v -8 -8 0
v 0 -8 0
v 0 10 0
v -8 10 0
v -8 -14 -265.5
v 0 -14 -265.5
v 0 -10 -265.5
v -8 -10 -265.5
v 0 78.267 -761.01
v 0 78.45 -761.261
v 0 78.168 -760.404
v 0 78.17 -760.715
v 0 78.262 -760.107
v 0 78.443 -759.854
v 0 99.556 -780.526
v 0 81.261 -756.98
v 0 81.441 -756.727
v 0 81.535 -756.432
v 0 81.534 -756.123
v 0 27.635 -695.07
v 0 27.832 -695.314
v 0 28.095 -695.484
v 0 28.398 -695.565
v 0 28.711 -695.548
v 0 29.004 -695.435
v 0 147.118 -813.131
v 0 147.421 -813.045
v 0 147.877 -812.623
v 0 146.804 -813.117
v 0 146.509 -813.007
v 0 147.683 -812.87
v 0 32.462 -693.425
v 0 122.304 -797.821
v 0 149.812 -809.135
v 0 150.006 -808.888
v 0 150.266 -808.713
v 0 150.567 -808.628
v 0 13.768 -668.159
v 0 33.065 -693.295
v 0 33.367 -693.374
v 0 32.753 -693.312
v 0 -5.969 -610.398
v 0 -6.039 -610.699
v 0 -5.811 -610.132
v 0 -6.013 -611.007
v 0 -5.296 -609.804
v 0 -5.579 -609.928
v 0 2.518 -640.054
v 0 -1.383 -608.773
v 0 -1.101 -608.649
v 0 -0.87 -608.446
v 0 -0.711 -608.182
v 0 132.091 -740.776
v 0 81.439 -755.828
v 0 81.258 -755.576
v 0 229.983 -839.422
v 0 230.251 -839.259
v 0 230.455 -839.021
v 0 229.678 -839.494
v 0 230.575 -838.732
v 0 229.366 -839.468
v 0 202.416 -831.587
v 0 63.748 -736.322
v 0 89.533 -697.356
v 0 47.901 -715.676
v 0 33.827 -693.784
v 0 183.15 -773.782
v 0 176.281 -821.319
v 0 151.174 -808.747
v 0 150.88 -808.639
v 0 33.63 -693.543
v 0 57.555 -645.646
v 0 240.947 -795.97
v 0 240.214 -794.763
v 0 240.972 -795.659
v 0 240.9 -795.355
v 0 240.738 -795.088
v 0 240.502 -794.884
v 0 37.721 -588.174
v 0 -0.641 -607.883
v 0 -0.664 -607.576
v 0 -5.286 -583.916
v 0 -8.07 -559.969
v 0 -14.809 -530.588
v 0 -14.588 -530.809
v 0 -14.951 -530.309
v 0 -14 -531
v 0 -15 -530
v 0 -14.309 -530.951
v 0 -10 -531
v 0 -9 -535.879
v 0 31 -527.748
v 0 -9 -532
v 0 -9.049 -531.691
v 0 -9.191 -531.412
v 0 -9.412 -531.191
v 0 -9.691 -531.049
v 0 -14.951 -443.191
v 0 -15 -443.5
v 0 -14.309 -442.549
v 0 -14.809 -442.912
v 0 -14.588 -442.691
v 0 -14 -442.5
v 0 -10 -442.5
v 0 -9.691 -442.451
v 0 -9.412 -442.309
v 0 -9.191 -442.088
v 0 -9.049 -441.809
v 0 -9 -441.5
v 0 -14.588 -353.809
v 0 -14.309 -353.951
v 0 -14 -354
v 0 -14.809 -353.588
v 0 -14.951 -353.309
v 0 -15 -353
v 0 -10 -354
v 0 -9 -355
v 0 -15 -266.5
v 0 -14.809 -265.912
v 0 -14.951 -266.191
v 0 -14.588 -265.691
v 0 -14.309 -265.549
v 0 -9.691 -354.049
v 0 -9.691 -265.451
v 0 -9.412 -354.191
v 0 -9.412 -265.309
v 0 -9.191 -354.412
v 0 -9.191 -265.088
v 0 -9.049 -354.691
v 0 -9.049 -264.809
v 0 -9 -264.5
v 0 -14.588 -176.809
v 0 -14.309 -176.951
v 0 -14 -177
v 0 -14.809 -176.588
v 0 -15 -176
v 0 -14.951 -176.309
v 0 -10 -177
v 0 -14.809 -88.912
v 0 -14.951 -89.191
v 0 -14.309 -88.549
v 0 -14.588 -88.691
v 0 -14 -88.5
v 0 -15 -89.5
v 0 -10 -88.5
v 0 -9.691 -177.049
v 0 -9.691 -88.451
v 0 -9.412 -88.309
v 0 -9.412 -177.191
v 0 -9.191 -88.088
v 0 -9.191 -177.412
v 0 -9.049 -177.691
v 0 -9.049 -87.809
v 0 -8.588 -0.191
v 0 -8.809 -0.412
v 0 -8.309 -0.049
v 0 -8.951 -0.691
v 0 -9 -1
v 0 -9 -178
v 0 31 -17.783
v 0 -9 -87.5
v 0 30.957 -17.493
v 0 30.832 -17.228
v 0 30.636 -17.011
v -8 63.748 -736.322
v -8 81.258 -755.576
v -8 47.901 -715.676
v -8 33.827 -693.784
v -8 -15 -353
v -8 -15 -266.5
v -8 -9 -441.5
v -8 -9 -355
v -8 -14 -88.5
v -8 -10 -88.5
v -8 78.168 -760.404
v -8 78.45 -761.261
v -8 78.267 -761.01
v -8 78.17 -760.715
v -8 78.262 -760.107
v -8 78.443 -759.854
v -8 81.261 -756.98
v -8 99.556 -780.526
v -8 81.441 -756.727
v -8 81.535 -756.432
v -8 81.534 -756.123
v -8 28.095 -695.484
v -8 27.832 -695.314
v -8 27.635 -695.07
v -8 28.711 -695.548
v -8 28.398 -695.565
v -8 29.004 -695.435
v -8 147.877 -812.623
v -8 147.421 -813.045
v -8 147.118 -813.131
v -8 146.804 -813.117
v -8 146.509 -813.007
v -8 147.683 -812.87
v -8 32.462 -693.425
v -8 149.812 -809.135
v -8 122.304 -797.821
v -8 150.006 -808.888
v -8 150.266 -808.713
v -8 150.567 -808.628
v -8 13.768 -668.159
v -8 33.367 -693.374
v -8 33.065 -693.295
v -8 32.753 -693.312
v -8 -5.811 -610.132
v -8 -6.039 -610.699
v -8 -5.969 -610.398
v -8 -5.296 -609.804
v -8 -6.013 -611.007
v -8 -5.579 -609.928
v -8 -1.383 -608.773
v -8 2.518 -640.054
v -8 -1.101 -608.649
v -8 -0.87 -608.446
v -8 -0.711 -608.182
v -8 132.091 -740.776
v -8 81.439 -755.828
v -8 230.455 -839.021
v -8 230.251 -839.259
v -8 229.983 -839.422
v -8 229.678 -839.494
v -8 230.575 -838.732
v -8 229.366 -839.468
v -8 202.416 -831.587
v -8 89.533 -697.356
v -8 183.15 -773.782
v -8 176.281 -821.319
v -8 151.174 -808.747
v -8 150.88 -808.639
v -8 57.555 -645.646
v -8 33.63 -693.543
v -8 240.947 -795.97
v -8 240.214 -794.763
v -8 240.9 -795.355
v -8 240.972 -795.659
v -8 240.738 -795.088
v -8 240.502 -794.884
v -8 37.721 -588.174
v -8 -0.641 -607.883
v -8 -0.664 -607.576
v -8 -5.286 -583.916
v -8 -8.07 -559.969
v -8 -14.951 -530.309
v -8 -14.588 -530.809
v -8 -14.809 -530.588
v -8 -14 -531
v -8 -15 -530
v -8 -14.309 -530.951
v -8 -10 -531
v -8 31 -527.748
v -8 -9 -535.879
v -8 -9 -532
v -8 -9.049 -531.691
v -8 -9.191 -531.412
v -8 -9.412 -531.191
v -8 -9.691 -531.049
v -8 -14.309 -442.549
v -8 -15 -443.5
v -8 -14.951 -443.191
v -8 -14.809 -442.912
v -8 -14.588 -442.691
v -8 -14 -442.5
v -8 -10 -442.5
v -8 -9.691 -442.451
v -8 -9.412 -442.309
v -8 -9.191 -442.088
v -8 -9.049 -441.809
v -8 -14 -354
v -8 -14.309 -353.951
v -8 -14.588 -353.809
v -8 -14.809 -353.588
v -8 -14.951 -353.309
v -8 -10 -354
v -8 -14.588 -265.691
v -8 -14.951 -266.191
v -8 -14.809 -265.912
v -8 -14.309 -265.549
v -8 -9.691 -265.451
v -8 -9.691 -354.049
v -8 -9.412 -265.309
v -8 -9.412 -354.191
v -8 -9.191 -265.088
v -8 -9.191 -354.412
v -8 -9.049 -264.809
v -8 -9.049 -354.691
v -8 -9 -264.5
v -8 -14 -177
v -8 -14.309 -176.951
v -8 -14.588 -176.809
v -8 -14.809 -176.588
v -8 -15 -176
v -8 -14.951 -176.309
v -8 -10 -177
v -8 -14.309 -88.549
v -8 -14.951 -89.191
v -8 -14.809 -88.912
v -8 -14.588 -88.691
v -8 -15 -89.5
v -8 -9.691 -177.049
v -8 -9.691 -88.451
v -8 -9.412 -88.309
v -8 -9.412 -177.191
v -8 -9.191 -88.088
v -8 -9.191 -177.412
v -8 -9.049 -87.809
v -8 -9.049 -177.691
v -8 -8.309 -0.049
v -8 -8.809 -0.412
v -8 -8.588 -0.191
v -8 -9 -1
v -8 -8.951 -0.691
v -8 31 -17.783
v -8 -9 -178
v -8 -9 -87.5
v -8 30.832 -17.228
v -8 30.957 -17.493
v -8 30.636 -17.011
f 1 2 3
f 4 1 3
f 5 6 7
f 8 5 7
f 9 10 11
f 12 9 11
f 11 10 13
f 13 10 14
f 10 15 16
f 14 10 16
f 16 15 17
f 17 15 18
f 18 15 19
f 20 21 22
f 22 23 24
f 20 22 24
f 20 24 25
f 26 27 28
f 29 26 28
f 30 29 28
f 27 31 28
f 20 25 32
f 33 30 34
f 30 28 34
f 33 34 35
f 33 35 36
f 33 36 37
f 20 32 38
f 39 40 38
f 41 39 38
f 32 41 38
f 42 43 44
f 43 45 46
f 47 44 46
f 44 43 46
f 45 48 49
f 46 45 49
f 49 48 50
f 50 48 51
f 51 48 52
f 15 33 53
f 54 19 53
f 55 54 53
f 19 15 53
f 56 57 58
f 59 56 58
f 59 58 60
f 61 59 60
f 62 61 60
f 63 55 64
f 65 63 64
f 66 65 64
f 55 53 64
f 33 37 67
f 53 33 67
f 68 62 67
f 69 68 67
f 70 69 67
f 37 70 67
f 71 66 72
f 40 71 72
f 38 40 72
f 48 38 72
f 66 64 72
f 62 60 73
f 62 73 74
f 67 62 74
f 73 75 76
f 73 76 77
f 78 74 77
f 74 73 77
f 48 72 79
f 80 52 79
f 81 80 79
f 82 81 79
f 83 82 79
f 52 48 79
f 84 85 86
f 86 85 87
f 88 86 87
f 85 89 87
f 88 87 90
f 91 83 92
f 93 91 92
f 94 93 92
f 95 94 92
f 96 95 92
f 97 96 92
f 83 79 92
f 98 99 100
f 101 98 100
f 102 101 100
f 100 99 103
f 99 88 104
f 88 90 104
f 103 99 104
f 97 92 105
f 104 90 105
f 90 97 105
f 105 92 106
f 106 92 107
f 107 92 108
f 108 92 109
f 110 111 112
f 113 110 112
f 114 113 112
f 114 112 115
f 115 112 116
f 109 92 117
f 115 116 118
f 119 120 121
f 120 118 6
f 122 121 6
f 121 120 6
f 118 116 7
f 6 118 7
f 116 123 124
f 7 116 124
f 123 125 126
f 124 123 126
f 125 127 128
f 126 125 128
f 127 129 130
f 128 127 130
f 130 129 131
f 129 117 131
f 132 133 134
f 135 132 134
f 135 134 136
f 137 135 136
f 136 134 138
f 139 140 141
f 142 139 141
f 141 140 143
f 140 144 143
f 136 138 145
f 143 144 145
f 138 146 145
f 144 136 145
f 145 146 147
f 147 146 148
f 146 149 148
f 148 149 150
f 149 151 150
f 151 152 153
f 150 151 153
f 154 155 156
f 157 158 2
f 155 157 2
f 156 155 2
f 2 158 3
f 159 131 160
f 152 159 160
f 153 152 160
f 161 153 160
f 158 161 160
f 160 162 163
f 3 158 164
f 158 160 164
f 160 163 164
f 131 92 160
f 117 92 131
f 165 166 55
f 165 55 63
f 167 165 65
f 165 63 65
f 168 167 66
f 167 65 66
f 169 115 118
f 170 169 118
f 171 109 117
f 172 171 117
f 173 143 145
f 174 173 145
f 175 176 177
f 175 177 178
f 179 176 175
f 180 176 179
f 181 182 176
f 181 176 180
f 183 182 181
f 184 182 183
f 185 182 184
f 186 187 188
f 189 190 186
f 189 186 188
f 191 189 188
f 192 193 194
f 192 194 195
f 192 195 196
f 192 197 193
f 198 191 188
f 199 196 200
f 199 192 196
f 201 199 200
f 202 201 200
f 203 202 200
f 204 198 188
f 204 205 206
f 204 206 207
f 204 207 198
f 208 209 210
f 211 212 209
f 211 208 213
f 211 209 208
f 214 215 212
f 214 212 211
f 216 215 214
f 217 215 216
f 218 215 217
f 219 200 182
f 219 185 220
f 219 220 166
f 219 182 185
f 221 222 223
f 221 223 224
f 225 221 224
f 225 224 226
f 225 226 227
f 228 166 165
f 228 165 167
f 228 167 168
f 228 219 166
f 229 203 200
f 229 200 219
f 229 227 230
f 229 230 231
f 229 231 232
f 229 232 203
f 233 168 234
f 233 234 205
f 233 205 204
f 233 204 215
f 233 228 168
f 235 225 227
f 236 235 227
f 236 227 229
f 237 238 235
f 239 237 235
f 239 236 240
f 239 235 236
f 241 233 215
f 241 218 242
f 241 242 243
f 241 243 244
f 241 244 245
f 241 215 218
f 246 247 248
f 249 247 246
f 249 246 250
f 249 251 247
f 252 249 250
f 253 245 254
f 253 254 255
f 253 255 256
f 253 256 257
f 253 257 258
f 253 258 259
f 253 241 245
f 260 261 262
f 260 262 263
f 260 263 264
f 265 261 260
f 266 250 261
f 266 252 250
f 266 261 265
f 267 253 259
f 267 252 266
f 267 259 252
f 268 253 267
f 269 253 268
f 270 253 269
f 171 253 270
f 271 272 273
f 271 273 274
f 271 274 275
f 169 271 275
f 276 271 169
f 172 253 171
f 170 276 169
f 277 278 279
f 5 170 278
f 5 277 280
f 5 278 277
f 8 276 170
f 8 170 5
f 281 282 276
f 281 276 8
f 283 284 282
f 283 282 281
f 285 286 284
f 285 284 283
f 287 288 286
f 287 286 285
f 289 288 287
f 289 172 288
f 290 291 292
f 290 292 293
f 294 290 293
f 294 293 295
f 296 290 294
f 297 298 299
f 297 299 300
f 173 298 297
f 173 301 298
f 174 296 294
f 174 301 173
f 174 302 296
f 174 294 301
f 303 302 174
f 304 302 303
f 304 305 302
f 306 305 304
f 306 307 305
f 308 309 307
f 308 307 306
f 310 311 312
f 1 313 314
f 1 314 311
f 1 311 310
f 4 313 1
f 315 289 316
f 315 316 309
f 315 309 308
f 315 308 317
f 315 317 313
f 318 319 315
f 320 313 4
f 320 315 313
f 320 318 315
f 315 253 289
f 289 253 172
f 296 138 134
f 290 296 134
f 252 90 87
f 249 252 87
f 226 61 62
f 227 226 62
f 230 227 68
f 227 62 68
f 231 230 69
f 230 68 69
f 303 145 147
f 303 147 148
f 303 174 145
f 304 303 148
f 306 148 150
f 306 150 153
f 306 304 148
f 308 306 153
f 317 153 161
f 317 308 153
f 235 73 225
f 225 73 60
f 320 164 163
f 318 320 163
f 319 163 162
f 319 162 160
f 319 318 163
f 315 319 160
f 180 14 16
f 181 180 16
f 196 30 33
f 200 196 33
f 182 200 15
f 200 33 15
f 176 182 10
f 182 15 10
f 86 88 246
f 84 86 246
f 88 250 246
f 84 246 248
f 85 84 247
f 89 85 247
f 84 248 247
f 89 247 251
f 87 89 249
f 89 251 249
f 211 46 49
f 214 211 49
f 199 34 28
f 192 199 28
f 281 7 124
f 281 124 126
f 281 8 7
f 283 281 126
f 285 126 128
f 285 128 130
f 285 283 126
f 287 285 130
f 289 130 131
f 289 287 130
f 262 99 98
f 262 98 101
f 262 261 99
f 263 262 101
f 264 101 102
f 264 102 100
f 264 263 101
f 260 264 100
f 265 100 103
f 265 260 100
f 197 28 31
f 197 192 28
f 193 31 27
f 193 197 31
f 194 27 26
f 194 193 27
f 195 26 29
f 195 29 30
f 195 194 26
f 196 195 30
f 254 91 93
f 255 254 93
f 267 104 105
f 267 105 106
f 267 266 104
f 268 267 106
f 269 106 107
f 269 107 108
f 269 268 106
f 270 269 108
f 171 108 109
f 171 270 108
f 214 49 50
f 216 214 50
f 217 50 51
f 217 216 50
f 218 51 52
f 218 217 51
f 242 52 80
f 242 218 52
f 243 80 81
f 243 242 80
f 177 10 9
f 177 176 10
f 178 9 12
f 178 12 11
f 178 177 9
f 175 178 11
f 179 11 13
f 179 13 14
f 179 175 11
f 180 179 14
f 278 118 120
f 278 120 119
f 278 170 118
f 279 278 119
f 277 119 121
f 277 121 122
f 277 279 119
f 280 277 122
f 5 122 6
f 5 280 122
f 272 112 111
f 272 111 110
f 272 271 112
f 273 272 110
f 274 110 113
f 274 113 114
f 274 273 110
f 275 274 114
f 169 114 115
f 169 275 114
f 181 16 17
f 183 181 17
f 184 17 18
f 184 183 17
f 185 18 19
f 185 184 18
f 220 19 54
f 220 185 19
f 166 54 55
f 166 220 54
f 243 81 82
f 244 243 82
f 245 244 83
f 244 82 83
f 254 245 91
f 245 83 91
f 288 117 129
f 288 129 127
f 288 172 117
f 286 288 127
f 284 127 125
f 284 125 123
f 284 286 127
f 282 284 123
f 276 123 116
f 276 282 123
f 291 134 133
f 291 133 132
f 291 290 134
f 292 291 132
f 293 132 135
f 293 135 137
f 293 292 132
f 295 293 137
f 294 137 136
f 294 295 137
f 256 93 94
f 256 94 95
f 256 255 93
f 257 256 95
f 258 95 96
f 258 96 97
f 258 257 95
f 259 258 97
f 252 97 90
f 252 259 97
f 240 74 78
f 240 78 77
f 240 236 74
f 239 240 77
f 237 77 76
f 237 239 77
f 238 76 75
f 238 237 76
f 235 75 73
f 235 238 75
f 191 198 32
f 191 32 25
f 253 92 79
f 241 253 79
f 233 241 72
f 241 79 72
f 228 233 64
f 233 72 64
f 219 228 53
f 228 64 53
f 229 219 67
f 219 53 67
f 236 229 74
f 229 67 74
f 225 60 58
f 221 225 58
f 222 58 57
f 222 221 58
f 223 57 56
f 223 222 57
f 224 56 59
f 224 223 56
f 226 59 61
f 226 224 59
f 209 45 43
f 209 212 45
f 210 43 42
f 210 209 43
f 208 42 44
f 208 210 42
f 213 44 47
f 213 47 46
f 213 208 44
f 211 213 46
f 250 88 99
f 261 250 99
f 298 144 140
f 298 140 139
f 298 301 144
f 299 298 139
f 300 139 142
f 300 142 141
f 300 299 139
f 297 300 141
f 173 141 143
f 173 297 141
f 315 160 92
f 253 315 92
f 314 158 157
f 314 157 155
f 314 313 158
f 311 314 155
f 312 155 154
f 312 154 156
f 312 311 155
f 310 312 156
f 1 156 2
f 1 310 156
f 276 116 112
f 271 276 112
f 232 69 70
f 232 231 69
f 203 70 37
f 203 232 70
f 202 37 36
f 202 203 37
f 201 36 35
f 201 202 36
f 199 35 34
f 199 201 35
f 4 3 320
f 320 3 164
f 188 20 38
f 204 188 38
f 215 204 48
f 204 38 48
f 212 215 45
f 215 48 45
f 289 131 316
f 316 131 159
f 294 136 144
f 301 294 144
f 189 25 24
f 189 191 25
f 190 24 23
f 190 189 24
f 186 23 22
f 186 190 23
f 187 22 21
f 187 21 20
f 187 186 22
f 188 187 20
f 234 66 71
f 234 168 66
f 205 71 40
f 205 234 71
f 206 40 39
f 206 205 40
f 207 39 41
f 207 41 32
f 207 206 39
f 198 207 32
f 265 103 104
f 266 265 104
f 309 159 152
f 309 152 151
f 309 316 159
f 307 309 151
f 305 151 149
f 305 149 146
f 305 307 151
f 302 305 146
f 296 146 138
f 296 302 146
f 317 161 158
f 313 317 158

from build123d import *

# Parameters (mm, degrees)
BASE_FLANGE1_DEPTH = 8
FILLET_1_0_R       = 1


# Sheet-metal steps are written as plain solids
with BuildPart() as part:
    # Sketch1 → Base-Flange1 (new body)
    with BuildSketch(Plane(origin=(0, 0, 0), x_dir=(0, 0, -1), z_dir=(1, 0, 0))):
        with BuildLine():
            Line((531, -15), (442.5, -15))
            Line((442.5, -15), (442.5, -9))
            Line((442.5, -9), (354, -9))
            Line((354, -9), (354, -15))
            Line((354, -15), (265.5, -15))
            Line((265.5, -15), (265.5, -9))
            Line((265.5, -9), (177, -9))
            Line((177, -9), (177, -15))
            Line((177, -15), (88.5, -15))
            Line((88.5, -15), (88.5, -9))
            Line((88.5, -9), (0, -9))
            Line((0, -9), (0, 10))
            Line((0, 10), (17.311064102, 31))
            Line((17.311064102, 31), (527.748052756, 31))
            ThreePointArc((527.748052756, 31), (697.748052756, 89.840336788), (795, 241.181818182))
            Line((795, 241.181818182), (839.703962084, 230.339504132))
            ThreePointArc((839.703962084, 230.339504132), (826.746837948, 189.2327939), (808.257153356, 150.299771211))
            Line((808.257153356, 150.299771211), (813.503193561, 147.387888287))
            ThreePointArc((813.503193561, 147.387888287), (789.433768579, 110.742928998), (760.560188707, 77.750404912))
            Line((760.560188707, 77.750404912), (756.275511236, 81.951113323))
            ThreePointArc((756.275511236, 81.951113323), (726.159050553, 55.606079515), (692.923211747, 33.325122864))
            Line((692.923211747, 33.325122864), (695.938293543, 28.137816444))
            ThreePointArc((695.938293543, 28.137816444), (654.250802879, 7.812798402), (610.053579846, -6.242759659))
            Line((610.053579846, -6.242759659), (608.523872748, -0.439504608))
            ThreePointArc((608.523872748, -0.439504608), (572.452930854, -6.852497602), (535.879339812, -9))
            Line((535.879339812, -9), (531, -9))
            Line((531, -9), (531, -15))
        make_face()
    extrude(amount=-BASE_FLANGE1_DEPTH)

    # Fillet-1.0
    fillet_1_0_edges = [part.edges().sort_by_distance(p)[0] for p in [
        (-4, 31, -17.311064102),
        (-4, 241.181818182, -795),
        (-4, 230.339504132, -839.703962084),
        (-4, 150.299771211, -808.257153356),
        (-4, 147.387888287, -813.503193561),
        (-4, 77.750404912, -760.560188707),
        (-4, 81.951113323, -756.275511236),
        (-4, 33.325122864, -692.923211747),
        (-4, 28.137816444, -695.938293543),
        (-4, -6.242759659, -610.053579846),
        (-4, -0.439504608, -608.523872748),
        (-4, -9, -531),
        (-4, -15, -531),
        (-4, -15, -442.5),
        (-4, -9, -442.5),
        (-4, -9, -354),
        (-4, -15, -354),
        (-4, -15, -265.5),
        (-4, -9, -265.5),
        (-4, -9, -177),
        (-4, -15, -177),
        (-4, -15, -88.5),
        (-4, -9, -88.5),
        (-4, -9, 0),
    ]]
    fillet(fillet_1_0_edges, radius=FILLET_1_0_R)


solid = part.part
